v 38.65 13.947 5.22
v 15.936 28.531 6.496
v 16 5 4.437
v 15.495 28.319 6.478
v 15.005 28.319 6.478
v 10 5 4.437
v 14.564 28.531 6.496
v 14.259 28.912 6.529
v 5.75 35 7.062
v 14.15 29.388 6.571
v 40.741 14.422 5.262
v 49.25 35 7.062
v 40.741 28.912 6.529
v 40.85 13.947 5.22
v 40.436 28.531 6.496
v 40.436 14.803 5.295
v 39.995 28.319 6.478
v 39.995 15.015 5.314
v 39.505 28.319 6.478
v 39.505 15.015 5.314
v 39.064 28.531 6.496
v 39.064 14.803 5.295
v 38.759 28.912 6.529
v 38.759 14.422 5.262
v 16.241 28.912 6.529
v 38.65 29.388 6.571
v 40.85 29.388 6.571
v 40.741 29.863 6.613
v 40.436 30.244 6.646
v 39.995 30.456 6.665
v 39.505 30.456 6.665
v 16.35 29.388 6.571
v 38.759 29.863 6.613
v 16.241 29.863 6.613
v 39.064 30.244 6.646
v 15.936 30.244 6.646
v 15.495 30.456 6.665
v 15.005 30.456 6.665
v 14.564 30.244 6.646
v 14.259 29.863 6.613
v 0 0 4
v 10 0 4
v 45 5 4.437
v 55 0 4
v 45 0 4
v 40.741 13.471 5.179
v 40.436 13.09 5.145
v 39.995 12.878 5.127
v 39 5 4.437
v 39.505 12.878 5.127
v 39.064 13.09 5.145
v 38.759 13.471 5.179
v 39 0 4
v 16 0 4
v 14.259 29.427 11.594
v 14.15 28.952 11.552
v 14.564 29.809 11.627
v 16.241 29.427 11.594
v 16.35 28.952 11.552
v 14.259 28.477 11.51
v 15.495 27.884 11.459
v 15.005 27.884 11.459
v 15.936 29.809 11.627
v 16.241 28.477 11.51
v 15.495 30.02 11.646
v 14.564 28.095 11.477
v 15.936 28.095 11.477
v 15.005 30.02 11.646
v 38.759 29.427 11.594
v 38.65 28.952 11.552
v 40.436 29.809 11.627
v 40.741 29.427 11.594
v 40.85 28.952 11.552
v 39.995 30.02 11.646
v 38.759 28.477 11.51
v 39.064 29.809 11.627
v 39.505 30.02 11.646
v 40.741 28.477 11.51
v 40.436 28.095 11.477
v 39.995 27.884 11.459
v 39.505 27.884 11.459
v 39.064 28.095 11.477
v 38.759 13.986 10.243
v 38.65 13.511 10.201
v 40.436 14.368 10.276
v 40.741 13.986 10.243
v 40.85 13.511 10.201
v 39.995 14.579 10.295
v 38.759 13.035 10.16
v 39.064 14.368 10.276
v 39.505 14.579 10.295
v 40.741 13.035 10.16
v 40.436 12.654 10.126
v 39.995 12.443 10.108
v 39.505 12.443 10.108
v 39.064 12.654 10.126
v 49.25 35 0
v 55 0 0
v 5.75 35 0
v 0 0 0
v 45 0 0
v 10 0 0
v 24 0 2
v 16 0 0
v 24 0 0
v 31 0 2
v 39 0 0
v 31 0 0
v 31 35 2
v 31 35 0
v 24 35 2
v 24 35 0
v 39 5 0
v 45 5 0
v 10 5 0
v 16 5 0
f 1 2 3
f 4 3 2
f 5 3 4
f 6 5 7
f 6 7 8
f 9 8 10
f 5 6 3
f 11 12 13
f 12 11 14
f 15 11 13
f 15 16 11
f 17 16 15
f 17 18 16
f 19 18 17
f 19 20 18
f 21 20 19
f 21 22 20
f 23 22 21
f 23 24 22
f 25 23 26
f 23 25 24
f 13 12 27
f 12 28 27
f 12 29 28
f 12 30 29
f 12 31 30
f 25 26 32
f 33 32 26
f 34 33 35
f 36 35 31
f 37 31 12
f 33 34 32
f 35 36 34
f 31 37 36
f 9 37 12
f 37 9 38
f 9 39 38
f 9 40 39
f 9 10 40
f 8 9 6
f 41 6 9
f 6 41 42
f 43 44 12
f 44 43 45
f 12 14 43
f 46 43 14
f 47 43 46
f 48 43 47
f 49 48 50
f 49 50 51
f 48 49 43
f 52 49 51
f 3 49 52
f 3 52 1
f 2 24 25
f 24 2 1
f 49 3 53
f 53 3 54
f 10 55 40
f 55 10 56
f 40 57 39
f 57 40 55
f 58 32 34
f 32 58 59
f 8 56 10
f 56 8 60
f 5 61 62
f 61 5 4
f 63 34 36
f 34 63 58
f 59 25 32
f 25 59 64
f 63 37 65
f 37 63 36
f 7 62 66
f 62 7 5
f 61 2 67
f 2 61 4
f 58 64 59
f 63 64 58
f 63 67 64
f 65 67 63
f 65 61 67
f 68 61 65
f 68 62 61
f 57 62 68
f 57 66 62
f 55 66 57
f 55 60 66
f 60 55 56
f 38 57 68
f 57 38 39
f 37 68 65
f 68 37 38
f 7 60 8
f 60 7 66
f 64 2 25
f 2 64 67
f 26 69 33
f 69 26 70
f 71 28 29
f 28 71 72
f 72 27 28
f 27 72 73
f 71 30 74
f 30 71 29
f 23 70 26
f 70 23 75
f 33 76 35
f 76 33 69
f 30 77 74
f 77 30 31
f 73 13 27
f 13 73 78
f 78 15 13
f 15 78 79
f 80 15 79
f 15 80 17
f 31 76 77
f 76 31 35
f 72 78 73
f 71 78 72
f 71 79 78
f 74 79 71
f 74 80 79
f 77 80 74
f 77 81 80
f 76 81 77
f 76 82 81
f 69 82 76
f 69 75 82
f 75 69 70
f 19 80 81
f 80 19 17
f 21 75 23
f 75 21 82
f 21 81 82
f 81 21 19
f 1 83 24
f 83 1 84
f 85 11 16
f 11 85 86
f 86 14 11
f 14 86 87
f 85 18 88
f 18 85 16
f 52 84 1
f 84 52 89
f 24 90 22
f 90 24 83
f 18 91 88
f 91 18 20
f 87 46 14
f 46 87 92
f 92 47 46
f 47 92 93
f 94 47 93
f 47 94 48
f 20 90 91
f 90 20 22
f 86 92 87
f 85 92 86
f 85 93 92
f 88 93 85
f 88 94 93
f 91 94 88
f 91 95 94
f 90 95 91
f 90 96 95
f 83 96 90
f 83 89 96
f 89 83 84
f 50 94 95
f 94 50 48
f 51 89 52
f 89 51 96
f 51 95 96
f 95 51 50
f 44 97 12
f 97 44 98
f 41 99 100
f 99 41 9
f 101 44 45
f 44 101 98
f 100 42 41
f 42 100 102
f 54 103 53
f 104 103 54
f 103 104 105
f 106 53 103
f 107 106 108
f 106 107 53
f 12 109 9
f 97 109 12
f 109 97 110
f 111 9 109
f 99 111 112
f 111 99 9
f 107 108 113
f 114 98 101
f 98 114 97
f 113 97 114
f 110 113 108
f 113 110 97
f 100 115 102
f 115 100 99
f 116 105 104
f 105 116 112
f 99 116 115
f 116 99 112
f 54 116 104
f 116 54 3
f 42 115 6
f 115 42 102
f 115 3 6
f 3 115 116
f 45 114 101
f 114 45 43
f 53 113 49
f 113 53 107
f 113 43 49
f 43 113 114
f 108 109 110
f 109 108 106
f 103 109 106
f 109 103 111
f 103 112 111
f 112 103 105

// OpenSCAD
// made the cylinders at least somewhat round.
$fa = 1;
$fs = 0.5;

board_mount_start_x = 15.25;
board_mount_start_y = 14;
hole_mount_radius = 1.1;
hole_mount_height = 5;

difference() {
linear_extrude(height=15)
    polygon(points=[[0, 0], [55, 0], [49.25, 35], [5.75, 35]], paths=1);
    translate([10, 0, 0])
    cube([6, 5, 10]);
    translate([39, 0, 0])
    cube([6, 5, 10]);
    // channel for cables
    translate([24, 0, 0])
    cube([7, 100, 2]);
    // slant for receiver board
    translate([0, 0, 4])
    rotate([5, 0, 0])
    difference() {
        cube([200, 200, 200]);
        translate([board_mount_start_x, board_mount_start_y+15.5, 0])
            cylinder(r=hole_mount_radius, h=hole_mount_height);
        translate([board_mount_start_x+24.5, board_mount_start_y+15.5, 0])
            cylinder(r=hole_mount_radius, h=hole_mount_height);
        translate([board_mount_start_x+24.5, board_mount_start_y, 0])
            cylinder(r=hole_mount_radius, h=hole_mount_height);
    }
}
